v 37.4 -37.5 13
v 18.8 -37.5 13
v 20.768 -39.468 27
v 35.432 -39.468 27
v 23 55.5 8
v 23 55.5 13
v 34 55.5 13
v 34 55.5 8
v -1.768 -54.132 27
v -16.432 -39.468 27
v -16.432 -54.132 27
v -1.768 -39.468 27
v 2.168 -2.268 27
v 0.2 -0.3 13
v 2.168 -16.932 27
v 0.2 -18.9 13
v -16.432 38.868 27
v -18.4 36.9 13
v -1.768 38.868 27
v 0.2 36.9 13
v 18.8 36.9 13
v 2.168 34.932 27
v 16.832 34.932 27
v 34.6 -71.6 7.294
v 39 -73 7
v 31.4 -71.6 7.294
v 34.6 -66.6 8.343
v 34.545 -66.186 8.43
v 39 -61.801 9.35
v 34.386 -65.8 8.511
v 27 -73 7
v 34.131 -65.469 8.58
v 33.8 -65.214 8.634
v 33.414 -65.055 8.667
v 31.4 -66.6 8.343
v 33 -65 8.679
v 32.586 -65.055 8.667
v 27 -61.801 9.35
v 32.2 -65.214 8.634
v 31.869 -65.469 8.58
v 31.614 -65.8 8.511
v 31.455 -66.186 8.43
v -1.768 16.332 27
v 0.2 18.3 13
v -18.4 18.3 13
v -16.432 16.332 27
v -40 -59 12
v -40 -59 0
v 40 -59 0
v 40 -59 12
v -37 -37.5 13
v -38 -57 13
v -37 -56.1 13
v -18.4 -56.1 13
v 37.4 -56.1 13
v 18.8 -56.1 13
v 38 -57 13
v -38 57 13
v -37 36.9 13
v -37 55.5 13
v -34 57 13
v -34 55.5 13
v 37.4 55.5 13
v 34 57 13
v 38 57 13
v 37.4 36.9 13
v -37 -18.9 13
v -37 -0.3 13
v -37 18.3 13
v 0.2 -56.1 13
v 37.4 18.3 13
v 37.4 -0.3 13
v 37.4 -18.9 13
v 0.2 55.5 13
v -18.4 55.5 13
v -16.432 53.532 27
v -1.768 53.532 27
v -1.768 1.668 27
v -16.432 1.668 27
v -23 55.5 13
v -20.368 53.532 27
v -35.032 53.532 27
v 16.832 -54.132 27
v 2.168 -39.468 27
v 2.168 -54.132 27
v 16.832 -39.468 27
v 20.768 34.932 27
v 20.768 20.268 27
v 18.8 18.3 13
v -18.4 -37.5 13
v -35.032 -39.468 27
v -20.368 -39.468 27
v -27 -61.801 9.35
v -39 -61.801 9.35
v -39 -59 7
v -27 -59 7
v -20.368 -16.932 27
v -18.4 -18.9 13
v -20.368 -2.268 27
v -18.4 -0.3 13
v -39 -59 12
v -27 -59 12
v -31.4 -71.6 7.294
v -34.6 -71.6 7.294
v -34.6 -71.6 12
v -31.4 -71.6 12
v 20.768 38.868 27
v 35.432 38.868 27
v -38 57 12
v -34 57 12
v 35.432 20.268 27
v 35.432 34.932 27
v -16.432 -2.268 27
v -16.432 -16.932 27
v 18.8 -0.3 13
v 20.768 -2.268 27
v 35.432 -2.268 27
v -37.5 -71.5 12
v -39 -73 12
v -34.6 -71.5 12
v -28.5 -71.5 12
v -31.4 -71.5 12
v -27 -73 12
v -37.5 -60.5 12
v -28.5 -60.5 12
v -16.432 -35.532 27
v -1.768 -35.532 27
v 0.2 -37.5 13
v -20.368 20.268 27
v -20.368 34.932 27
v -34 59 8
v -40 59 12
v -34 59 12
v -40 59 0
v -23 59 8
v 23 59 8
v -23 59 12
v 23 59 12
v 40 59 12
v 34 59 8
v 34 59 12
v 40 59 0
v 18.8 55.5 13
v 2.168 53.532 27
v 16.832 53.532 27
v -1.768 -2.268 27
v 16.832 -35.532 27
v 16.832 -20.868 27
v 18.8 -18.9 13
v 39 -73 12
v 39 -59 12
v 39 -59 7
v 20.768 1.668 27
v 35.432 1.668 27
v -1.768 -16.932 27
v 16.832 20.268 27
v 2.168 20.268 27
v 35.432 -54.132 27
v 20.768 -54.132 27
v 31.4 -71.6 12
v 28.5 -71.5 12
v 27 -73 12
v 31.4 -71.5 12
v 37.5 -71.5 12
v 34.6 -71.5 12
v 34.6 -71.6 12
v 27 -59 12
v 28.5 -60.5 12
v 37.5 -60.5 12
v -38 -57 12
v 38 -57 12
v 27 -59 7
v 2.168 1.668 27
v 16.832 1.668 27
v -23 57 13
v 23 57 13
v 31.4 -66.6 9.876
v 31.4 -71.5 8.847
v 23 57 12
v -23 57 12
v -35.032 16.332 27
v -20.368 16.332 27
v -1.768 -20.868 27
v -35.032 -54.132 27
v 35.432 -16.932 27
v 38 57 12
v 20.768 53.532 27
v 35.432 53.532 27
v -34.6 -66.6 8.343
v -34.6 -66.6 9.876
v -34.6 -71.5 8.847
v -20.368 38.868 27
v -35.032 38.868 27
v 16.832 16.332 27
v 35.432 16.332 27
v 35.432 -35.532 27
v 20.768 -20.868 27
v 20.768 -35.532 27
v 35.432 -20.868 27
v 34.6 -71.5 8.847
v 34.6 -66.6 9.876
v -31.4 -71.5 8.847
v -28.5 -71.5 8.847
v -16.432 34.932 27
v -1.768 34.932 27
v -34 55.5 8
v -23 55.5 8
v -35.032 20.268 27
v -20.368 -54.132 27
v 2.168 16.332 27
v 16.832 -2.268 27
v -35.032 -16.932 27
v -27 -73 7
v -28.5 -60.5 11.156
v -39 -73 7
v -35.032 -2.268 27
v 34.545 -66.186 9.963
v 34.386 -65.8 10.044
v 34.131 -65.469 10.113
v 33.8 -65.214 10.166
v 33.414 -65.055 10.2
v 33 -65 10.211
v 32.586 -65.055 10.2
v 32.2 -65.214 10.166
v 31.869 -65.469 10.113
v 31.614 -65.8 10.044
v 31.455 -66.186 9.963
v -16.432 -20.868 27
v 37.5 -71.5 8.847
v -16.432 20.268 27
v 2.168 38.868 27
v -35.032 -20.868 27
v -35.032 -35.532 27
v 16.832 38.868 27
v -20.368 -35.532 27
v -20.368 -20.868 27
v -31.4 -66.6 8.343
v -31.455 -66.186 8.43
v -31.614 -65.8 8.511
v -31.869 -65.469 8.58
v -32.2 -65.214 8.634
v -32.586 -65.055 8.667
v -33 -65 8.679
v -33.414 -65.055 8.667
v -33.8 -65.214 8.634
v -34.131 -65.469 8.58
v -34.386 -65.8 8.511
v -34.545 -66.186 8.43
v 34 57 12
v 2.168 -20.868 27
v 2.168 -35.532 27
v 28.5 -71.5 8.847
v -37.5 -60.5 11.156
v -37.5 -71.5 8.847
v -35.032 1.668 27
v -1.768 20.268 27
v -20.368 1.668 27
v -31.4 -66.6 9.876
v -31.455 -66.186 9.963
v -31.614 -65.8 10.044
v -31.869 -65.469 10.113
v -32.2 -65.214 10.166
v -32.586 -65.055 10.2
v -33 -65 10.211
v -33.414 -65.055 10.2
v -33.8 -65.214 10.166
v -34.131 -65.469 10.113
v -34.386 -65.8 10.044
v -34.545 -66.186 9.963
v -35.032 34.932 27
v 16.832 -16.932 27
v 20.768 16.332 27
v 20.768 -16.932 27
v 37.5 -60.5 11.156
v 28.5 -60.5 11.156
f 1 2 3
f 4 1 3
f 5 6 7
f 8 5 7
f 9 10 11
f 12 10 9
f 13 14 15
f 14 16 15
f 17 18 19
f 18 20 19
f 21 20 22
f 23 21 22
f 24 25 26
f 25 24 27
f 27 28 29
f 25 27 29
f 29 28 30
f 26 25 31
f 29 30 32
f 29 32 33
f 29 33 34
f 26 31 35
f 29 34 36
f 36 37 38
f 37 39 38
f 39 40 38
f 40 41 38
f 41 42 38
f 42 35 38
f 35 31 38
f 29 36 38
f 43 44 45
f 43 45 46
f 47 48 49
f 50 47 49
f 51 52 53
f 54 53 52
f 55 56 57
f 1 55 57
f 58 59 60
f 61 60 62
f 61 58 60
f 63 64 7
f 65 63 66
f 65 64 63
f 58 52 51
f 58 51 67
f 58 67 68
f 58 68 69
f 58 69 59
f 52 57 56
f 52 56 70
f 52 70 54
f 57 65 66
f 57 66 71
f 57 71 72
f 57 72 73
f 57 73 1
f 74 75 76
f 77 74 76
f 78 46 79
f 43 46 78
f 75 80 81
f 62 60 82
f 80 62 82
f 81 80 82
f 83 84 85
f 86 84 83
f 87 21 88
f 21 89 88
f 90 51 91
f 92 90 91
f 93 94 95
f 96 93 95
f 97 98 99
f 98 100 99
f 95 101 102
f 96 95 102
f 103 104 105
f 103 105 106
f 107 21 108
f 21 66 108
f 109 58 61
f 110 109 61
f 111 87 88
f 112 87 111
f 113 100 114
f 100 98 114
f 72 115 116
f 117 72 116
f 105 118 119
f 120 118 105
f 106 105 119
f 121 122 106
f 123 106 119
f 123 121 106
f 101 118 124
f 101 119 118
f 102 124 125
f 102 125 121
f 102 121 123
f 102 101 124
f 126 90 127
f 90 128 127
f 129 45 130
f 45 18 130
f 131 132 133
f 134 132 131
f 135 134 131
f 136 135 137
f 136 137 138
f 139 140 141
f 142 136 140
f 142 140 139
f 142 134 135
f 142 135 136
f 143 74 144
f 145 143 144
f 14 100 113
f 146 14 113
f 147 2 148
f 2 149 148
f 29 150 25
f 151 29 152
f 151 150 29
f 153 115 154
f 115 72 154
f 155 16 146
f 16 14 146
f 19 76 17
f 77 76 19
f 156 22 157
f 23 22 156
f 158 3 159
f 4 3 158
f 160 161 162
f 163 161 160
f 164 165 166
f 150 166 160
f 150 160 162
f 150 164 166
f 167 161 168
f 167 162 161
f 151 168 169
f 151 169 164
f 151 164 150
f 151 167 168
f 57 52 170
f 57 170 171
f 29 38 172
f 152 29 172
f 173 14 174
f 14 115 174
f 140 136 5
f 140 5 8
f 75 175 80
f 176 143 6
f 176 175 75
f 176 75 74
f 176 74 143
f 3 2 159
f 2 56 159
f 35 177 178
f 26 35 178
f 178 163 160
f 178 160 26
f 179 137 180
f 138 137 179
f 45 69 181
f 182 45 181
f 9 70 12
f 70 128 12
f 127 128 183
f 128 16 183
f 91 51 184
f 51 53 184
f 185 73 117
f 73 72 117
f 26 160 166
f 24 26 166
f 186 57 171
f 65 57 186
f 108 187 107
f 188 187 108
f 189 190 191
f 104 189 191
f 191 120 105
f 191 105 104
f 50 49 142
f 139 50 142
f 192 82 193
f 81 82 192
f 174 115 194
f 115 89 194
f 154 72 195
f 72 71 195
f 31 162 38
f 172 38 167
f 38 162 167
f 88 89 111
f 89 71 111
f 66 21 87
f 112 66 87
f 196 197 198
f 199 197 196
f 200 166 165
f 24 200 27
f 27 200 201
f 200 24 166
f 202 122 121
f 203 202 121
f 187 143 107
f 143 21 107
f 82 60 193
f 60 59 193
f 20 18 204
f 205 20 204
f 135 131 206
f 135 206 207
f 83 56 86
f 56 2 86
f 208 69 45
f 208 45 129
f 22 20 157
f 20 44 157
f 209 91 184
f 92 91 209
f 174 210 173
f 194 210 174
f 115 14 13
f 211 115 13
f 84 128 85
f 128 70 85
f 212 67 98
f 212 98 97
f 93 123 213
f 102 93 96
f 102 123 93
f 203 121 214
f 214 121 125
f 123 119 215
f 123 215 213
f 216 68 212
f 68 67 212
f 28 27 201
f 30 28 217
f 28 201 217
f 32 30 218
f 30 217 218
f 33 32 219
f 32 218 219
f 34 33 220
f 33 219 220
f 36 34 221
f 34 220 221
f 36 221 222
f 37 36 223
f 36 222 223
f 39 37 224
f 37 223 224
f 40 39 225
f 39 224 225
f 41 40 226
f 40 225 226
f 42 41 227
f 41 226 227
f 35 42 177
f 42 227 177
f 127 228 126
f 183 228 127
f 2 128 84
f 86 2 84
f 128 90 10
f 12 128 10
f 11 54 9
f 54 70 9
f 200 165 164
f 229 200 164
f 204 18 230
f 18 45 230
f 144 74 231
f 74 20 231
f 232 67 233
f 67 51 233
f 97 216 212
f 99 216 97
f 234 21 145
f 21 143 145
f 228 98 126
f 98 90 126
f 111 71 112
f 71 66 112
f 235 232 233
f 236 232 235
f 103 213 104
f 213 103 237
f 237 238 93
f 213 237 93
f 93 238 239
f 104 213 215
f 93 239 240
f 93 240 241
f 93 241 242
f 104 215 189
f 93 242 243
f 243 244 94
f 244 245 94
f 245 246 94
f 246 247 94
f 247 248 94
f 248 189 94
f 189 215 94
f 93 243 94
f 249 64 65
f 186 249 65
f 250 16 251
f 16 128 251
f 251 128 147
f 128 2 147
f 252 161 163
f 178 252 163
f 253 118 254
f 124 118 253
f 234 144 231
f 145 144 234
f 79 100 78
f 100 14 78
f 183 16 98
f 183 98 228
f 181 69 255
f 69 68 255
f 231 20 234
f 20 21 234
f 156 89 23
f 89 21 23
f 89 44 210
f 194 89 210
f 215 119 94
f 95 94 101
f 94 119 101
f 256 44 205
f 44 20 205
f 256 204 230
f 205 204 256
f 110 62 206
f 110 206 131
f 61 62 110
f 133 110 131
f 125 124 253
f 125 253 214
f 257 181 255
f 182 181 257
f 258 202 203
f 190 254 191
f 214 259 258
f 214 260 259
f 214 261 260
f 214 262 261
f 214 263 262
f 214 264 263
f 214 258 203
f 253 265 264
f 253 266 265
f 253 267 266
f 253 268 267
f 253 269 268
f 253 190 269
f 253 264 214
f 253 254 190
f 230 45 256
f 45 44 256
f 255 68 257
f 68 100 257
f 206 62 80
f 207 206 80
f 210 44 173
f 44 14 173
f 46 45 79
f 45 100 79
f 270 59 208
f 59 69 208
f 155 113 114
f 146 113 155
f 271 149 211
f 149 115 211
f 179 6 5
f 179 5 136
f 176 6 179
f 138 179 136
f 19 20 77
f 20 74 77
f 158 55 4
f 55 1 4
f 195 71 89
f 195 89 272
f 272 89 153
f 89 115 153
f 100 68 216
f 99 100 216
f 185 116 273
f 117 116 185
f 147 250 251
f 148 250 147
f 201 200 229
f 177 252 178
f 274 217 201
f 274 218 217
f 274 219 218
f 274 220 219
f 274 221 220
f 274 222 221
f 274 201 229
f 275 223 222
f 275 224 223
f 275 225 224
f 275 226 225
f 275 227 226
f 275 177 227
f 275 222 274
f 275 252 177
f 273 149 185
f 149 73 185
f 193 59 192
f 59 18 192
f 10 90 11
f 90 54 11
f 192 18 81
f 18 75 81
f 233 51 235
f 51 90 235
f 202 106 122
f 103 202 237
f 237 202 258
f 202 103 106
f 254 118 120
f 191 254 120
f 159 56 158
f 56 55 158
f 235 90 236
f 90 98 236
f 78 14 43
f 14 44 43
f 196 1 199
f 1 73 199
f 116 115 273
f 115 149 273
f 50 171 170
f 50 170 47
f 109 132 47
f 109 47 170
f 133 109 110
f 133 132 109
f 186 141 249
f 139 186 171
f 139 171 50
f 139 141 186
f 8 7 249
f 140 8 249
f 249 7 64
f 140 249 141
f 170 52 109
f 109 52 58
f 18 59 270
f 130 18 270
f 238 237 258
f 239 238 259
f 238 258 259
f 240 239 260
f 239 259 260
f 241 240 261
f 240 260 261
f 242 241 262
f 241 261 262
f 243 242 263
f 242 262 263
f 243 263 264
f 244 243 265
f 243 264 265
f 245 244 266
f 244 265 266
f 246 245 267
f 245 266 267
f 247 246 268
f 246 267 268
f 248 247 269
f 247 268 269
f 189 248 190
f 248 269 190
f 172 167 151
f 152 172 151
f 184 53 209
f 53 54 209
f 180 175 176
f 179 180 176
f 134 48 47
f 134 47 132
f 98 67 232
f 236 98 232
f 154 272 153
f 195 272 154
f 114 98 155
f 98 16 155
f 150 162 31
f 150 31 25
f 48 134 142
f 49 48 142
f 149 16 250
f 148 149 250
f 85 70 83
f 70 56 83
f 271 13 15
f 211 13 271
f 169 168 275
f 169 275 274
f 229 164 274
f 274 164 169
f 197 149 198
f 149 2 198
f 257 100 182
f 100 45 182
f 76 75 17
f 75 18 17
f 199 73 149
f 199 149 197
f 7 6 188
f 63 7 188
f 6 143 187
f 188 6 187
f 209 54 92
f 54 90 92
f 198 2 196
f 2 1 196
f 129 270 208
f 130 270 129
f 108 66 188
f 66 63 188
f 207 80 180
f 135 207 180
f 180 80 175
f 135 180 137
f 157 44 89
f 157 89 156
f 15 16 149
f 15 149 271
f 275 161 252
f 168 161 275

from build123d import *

# Parameters (mm, degrees)
SKETCH_1_W                  = 80
SKETCH_1_H                  = 118
EXTRUDE_1_DEPTH             = 13
SKETCH_2_W                  = 18.6
SKETCH_2_H                  = 18.6
EXTRUDE_2_DEPTH             = 14
EXTRUDE_2_TAPER             = 8
PATTERN_LINEAR_1_COUNT      = 4
PATTERN_LINEAR_1_PITCH      = 18.6
PATTERN_LINEAR_1_COUNT_DIR2 = 6
PATTERN_LINEAR_1_PITCH_DIR2 = 18.6
SKETCH_3_W                  = 11
SKETCH_3_H                  = 3.5
CUT_EXTRUDE_1_DEPTH         = 5
SKETCH_5_W                  = 80
SKETCH_5_H                  = 118
SKETCH_5_W_2                = 76
SKETCH_5_H_2                = 114
CUT_EXTRUDE_1_2_DEPTH       = 1
SKETCH_4_W                  = 12
SKETCH_4_H                  = 14
EXTRUDE_3_DEPTH             = 5
EXTRUDE_3_2_DEPTH           = 5
CUT_EXTRUDE_2_DEPTH         = 111.900856624
CUT_EXTRUDE_3_REACH         = 86.581
SKETCH_7_W                  = 9
SKETCH_7_H                  = 11


with BuildPart() as part:
    # Эскиз1 → Бобышка-Вытянуть1 (new body)
    with BuildSketch(Plane.XY):
        Rectangle(SKETCH_1_W, SKETCH_1_H)
    extrude(amount=EXTRUDE_1_DEPTH)

    # Эскиз2 → Бобышка-Вытянуть2 (add)
    with BuildSketch(Plane.XY.offset(13)):
        with Locations((-27.7, 46.2)):
            Rectangle(SKETCH_2_W, SKETCH_2_H)
    extrude_2 = extrude(amount=EXTRUDE_2_DEPTH, taper=EXTRUDE_2_TAPER)

    # Линейный массив1: Extrude 2 4 × 6
    with Locations(*[(i * PATTERN_LINEAR_1_PITCH, -j * PATTERN_LINEAR_1_PITCH_DIR2, 0) for i in range(PATTERN_LINEAR_1_COUNT) for j in range(PATTERN_LINEAR_1_COUNT_DIR2) if (i, j) != (0, 0)]):
        add(extrude_2)

    # Эскиз3 → Cut-Extrude 1 (cut)
    with BuildSketch(Plane.XY.offset(13)):
        with Locations((-28.5, 57.25)):
            Rectangle(SKETCH_3_W, SKETCH_3_H)
        with Locations((28.5, 57.25)):
            Rectangle(SKETCH_3_W, SKETCH_3_H)
    extrude(amount=-CUT_EXTRUDE_1_DEPTH, mode=Mode.SUBTRACT)

    # Эскиз5 → Cut-Extrude 1 2 (cut)
    with BuildSketch(Plane.XY.offset(13)):
        Rectangle(SKETCH_5_W, SKETCH_5_H)
        Rectangle(SKETCH_5_W_2, SKETCH_5_H_2, mode=Mode.SUBTRACT)
    extrude(amount=-CUT_EXTRUDE_1_2_DEPTH, mode=Mode.SUBTRACT)


with BuildPart() as body_2:
    # Эскиз4 → Бобышка-Вытянуть3 (new body)
    with BuildSketch(Plane.XY.offset(12)):
        with Locations((-33, -66)):
            Rectangle(SKETCH_4_W, SKETCH_4_H)
        with BuildLine():
            Line((-34.6, -66.6), (-34.6, -71.6))
            Line((-34.6, -71.6), (-31.4, -71.6))
            Line((-31.4, -71.6), (-31.4, -66.6))
            ThreePointArc((-31.4, -66.6), (-33, -65), (-34.6, -66.6))
        make_face(mode=Mode.SUBTRACT)
    extrude(amount=-EXTRUDE_3_DEPTH)


with BuildPart() as body_3:
    # Эскиз4 → Extrude 3 2 (new body)
    with BuildSketch(Plane.XY.offset(12)):
        with Locations((33, -66)):
            Rectangle(SKETCH_4_W, SKETCH_4_H)
        with BuildLine():
            Line((31.4, -66.6), (31.4, -71.6))
            Line((31.4, -71.6), (34.6, -71.6))
            Line((34.6, -71.6), (34.6, -66.6))
            ThreePointArc((34.6, -66.6), (33, -65), (31.4, -66.6))
        make_face(mode=Mode.SUBTRACT)
    extrude(amount=-EXTRUDE_3_2_DEPTH)


with BuildPart() as cut_extrude_2_tool:
    # Эскиз6 → Вырез-Вытянуть2 (new, through all)
    with BuildSketch(Plane.ZY.offset(39)):
        Polygon((7, -73), (9.350197069, -61.800584239), (7, -59), align=None)
    extrude(amount=-CUT_EXTRUDE_2_DEPTH)


with BuildPart() as body_2_1:
    add(body_2.part)

    # Вырез-Вытянуть2: cut by cut_extrude_2_tool
    add(cut_extrude_2_tool.part, mode=Mode.SUBTRACT)


with BuildPart() as body_3_1:
    add(body_3.part)

    # Вырез-Вытянуть2: cut by cut_extrude_2_tool
    add(cut_extrude_2_tool.part, mode=Mode.SUBTRACT)


with BuildPart() as cut_extrude_3_tool:
    # Вырез-Вытянуть3: up to this plane
    cut_extrude_3_end = Plane(origin=(40, -73.308064904, 8.468024528), z_dir=(0, -0.20537660273747238, 0.9786830186776587))
    # Эскиз7 → Вырез-Вытянуть3 (new, up to the surface)
    with BuildSketch(Plane.XY.offset(12), mode=Mode.PRIVATE) as cut_extrude_3_sk1:
        with Locations((-33, -66)):
            Rectangle(SKETCH_7_W, SKETCH_7_H)
    cut_extrude_3_tool1 = split(extrude(cut_extrude_3_sk1.sketch, amount=-CUT_EXTRUDE_3_REACH, mode=Mode.PRIVATE), bisect_by=cut_extrude_3_end, keep=Keep.BOTH, mode=Mode.PRIVATE)
    add(cut_extrude_3_tool1.solids().sort_by_distance((-33, -66, 12))[0])
    # Эскиз7 → Вырез-Вытянуть3 (new, up to the surface)
    with BuildSketch(Plane.XY.offset(12), mode=Mode.PRIVATE) as cut_extrude_3_sk2:
        with Locations((33, -66)):
            Rectangle(SKETCH_7_W, SKETCH_7_H)
    cut_extrude_3_tool2 = split(extrude(cut_extrude_3_sk2.sketch, amount=-CUT_EXTRUDE_3_REACH, mode=Mode.PRIVATE), bisect_by=cut_extrude_3_end, keep=Keep.BOTH, mode=Mode.PRIVATE)
    add(cut_extrude_3_tool2.solids().sort_by_distance((33, -66, 12))[0])


with BuildPart() as body_2_2:
    add(body_2_1.part)

    # Вырез-Вытянуть3: cut by cut_extrude_3_tool
    add(cut_extrude_3_tool.part, mode=Mode.SUBTRACT)


with BuildPart() as body_3_2:
    add(body_3_1.part)

    # Вырез-Вытянуть3: cut by cut_extrude_3_tool
    add(cut_extrude_3_tool.part, mode=Mode.SUBTRACT)


solid = Compound([part.part, body_2_2.part, body_3_2.part])
